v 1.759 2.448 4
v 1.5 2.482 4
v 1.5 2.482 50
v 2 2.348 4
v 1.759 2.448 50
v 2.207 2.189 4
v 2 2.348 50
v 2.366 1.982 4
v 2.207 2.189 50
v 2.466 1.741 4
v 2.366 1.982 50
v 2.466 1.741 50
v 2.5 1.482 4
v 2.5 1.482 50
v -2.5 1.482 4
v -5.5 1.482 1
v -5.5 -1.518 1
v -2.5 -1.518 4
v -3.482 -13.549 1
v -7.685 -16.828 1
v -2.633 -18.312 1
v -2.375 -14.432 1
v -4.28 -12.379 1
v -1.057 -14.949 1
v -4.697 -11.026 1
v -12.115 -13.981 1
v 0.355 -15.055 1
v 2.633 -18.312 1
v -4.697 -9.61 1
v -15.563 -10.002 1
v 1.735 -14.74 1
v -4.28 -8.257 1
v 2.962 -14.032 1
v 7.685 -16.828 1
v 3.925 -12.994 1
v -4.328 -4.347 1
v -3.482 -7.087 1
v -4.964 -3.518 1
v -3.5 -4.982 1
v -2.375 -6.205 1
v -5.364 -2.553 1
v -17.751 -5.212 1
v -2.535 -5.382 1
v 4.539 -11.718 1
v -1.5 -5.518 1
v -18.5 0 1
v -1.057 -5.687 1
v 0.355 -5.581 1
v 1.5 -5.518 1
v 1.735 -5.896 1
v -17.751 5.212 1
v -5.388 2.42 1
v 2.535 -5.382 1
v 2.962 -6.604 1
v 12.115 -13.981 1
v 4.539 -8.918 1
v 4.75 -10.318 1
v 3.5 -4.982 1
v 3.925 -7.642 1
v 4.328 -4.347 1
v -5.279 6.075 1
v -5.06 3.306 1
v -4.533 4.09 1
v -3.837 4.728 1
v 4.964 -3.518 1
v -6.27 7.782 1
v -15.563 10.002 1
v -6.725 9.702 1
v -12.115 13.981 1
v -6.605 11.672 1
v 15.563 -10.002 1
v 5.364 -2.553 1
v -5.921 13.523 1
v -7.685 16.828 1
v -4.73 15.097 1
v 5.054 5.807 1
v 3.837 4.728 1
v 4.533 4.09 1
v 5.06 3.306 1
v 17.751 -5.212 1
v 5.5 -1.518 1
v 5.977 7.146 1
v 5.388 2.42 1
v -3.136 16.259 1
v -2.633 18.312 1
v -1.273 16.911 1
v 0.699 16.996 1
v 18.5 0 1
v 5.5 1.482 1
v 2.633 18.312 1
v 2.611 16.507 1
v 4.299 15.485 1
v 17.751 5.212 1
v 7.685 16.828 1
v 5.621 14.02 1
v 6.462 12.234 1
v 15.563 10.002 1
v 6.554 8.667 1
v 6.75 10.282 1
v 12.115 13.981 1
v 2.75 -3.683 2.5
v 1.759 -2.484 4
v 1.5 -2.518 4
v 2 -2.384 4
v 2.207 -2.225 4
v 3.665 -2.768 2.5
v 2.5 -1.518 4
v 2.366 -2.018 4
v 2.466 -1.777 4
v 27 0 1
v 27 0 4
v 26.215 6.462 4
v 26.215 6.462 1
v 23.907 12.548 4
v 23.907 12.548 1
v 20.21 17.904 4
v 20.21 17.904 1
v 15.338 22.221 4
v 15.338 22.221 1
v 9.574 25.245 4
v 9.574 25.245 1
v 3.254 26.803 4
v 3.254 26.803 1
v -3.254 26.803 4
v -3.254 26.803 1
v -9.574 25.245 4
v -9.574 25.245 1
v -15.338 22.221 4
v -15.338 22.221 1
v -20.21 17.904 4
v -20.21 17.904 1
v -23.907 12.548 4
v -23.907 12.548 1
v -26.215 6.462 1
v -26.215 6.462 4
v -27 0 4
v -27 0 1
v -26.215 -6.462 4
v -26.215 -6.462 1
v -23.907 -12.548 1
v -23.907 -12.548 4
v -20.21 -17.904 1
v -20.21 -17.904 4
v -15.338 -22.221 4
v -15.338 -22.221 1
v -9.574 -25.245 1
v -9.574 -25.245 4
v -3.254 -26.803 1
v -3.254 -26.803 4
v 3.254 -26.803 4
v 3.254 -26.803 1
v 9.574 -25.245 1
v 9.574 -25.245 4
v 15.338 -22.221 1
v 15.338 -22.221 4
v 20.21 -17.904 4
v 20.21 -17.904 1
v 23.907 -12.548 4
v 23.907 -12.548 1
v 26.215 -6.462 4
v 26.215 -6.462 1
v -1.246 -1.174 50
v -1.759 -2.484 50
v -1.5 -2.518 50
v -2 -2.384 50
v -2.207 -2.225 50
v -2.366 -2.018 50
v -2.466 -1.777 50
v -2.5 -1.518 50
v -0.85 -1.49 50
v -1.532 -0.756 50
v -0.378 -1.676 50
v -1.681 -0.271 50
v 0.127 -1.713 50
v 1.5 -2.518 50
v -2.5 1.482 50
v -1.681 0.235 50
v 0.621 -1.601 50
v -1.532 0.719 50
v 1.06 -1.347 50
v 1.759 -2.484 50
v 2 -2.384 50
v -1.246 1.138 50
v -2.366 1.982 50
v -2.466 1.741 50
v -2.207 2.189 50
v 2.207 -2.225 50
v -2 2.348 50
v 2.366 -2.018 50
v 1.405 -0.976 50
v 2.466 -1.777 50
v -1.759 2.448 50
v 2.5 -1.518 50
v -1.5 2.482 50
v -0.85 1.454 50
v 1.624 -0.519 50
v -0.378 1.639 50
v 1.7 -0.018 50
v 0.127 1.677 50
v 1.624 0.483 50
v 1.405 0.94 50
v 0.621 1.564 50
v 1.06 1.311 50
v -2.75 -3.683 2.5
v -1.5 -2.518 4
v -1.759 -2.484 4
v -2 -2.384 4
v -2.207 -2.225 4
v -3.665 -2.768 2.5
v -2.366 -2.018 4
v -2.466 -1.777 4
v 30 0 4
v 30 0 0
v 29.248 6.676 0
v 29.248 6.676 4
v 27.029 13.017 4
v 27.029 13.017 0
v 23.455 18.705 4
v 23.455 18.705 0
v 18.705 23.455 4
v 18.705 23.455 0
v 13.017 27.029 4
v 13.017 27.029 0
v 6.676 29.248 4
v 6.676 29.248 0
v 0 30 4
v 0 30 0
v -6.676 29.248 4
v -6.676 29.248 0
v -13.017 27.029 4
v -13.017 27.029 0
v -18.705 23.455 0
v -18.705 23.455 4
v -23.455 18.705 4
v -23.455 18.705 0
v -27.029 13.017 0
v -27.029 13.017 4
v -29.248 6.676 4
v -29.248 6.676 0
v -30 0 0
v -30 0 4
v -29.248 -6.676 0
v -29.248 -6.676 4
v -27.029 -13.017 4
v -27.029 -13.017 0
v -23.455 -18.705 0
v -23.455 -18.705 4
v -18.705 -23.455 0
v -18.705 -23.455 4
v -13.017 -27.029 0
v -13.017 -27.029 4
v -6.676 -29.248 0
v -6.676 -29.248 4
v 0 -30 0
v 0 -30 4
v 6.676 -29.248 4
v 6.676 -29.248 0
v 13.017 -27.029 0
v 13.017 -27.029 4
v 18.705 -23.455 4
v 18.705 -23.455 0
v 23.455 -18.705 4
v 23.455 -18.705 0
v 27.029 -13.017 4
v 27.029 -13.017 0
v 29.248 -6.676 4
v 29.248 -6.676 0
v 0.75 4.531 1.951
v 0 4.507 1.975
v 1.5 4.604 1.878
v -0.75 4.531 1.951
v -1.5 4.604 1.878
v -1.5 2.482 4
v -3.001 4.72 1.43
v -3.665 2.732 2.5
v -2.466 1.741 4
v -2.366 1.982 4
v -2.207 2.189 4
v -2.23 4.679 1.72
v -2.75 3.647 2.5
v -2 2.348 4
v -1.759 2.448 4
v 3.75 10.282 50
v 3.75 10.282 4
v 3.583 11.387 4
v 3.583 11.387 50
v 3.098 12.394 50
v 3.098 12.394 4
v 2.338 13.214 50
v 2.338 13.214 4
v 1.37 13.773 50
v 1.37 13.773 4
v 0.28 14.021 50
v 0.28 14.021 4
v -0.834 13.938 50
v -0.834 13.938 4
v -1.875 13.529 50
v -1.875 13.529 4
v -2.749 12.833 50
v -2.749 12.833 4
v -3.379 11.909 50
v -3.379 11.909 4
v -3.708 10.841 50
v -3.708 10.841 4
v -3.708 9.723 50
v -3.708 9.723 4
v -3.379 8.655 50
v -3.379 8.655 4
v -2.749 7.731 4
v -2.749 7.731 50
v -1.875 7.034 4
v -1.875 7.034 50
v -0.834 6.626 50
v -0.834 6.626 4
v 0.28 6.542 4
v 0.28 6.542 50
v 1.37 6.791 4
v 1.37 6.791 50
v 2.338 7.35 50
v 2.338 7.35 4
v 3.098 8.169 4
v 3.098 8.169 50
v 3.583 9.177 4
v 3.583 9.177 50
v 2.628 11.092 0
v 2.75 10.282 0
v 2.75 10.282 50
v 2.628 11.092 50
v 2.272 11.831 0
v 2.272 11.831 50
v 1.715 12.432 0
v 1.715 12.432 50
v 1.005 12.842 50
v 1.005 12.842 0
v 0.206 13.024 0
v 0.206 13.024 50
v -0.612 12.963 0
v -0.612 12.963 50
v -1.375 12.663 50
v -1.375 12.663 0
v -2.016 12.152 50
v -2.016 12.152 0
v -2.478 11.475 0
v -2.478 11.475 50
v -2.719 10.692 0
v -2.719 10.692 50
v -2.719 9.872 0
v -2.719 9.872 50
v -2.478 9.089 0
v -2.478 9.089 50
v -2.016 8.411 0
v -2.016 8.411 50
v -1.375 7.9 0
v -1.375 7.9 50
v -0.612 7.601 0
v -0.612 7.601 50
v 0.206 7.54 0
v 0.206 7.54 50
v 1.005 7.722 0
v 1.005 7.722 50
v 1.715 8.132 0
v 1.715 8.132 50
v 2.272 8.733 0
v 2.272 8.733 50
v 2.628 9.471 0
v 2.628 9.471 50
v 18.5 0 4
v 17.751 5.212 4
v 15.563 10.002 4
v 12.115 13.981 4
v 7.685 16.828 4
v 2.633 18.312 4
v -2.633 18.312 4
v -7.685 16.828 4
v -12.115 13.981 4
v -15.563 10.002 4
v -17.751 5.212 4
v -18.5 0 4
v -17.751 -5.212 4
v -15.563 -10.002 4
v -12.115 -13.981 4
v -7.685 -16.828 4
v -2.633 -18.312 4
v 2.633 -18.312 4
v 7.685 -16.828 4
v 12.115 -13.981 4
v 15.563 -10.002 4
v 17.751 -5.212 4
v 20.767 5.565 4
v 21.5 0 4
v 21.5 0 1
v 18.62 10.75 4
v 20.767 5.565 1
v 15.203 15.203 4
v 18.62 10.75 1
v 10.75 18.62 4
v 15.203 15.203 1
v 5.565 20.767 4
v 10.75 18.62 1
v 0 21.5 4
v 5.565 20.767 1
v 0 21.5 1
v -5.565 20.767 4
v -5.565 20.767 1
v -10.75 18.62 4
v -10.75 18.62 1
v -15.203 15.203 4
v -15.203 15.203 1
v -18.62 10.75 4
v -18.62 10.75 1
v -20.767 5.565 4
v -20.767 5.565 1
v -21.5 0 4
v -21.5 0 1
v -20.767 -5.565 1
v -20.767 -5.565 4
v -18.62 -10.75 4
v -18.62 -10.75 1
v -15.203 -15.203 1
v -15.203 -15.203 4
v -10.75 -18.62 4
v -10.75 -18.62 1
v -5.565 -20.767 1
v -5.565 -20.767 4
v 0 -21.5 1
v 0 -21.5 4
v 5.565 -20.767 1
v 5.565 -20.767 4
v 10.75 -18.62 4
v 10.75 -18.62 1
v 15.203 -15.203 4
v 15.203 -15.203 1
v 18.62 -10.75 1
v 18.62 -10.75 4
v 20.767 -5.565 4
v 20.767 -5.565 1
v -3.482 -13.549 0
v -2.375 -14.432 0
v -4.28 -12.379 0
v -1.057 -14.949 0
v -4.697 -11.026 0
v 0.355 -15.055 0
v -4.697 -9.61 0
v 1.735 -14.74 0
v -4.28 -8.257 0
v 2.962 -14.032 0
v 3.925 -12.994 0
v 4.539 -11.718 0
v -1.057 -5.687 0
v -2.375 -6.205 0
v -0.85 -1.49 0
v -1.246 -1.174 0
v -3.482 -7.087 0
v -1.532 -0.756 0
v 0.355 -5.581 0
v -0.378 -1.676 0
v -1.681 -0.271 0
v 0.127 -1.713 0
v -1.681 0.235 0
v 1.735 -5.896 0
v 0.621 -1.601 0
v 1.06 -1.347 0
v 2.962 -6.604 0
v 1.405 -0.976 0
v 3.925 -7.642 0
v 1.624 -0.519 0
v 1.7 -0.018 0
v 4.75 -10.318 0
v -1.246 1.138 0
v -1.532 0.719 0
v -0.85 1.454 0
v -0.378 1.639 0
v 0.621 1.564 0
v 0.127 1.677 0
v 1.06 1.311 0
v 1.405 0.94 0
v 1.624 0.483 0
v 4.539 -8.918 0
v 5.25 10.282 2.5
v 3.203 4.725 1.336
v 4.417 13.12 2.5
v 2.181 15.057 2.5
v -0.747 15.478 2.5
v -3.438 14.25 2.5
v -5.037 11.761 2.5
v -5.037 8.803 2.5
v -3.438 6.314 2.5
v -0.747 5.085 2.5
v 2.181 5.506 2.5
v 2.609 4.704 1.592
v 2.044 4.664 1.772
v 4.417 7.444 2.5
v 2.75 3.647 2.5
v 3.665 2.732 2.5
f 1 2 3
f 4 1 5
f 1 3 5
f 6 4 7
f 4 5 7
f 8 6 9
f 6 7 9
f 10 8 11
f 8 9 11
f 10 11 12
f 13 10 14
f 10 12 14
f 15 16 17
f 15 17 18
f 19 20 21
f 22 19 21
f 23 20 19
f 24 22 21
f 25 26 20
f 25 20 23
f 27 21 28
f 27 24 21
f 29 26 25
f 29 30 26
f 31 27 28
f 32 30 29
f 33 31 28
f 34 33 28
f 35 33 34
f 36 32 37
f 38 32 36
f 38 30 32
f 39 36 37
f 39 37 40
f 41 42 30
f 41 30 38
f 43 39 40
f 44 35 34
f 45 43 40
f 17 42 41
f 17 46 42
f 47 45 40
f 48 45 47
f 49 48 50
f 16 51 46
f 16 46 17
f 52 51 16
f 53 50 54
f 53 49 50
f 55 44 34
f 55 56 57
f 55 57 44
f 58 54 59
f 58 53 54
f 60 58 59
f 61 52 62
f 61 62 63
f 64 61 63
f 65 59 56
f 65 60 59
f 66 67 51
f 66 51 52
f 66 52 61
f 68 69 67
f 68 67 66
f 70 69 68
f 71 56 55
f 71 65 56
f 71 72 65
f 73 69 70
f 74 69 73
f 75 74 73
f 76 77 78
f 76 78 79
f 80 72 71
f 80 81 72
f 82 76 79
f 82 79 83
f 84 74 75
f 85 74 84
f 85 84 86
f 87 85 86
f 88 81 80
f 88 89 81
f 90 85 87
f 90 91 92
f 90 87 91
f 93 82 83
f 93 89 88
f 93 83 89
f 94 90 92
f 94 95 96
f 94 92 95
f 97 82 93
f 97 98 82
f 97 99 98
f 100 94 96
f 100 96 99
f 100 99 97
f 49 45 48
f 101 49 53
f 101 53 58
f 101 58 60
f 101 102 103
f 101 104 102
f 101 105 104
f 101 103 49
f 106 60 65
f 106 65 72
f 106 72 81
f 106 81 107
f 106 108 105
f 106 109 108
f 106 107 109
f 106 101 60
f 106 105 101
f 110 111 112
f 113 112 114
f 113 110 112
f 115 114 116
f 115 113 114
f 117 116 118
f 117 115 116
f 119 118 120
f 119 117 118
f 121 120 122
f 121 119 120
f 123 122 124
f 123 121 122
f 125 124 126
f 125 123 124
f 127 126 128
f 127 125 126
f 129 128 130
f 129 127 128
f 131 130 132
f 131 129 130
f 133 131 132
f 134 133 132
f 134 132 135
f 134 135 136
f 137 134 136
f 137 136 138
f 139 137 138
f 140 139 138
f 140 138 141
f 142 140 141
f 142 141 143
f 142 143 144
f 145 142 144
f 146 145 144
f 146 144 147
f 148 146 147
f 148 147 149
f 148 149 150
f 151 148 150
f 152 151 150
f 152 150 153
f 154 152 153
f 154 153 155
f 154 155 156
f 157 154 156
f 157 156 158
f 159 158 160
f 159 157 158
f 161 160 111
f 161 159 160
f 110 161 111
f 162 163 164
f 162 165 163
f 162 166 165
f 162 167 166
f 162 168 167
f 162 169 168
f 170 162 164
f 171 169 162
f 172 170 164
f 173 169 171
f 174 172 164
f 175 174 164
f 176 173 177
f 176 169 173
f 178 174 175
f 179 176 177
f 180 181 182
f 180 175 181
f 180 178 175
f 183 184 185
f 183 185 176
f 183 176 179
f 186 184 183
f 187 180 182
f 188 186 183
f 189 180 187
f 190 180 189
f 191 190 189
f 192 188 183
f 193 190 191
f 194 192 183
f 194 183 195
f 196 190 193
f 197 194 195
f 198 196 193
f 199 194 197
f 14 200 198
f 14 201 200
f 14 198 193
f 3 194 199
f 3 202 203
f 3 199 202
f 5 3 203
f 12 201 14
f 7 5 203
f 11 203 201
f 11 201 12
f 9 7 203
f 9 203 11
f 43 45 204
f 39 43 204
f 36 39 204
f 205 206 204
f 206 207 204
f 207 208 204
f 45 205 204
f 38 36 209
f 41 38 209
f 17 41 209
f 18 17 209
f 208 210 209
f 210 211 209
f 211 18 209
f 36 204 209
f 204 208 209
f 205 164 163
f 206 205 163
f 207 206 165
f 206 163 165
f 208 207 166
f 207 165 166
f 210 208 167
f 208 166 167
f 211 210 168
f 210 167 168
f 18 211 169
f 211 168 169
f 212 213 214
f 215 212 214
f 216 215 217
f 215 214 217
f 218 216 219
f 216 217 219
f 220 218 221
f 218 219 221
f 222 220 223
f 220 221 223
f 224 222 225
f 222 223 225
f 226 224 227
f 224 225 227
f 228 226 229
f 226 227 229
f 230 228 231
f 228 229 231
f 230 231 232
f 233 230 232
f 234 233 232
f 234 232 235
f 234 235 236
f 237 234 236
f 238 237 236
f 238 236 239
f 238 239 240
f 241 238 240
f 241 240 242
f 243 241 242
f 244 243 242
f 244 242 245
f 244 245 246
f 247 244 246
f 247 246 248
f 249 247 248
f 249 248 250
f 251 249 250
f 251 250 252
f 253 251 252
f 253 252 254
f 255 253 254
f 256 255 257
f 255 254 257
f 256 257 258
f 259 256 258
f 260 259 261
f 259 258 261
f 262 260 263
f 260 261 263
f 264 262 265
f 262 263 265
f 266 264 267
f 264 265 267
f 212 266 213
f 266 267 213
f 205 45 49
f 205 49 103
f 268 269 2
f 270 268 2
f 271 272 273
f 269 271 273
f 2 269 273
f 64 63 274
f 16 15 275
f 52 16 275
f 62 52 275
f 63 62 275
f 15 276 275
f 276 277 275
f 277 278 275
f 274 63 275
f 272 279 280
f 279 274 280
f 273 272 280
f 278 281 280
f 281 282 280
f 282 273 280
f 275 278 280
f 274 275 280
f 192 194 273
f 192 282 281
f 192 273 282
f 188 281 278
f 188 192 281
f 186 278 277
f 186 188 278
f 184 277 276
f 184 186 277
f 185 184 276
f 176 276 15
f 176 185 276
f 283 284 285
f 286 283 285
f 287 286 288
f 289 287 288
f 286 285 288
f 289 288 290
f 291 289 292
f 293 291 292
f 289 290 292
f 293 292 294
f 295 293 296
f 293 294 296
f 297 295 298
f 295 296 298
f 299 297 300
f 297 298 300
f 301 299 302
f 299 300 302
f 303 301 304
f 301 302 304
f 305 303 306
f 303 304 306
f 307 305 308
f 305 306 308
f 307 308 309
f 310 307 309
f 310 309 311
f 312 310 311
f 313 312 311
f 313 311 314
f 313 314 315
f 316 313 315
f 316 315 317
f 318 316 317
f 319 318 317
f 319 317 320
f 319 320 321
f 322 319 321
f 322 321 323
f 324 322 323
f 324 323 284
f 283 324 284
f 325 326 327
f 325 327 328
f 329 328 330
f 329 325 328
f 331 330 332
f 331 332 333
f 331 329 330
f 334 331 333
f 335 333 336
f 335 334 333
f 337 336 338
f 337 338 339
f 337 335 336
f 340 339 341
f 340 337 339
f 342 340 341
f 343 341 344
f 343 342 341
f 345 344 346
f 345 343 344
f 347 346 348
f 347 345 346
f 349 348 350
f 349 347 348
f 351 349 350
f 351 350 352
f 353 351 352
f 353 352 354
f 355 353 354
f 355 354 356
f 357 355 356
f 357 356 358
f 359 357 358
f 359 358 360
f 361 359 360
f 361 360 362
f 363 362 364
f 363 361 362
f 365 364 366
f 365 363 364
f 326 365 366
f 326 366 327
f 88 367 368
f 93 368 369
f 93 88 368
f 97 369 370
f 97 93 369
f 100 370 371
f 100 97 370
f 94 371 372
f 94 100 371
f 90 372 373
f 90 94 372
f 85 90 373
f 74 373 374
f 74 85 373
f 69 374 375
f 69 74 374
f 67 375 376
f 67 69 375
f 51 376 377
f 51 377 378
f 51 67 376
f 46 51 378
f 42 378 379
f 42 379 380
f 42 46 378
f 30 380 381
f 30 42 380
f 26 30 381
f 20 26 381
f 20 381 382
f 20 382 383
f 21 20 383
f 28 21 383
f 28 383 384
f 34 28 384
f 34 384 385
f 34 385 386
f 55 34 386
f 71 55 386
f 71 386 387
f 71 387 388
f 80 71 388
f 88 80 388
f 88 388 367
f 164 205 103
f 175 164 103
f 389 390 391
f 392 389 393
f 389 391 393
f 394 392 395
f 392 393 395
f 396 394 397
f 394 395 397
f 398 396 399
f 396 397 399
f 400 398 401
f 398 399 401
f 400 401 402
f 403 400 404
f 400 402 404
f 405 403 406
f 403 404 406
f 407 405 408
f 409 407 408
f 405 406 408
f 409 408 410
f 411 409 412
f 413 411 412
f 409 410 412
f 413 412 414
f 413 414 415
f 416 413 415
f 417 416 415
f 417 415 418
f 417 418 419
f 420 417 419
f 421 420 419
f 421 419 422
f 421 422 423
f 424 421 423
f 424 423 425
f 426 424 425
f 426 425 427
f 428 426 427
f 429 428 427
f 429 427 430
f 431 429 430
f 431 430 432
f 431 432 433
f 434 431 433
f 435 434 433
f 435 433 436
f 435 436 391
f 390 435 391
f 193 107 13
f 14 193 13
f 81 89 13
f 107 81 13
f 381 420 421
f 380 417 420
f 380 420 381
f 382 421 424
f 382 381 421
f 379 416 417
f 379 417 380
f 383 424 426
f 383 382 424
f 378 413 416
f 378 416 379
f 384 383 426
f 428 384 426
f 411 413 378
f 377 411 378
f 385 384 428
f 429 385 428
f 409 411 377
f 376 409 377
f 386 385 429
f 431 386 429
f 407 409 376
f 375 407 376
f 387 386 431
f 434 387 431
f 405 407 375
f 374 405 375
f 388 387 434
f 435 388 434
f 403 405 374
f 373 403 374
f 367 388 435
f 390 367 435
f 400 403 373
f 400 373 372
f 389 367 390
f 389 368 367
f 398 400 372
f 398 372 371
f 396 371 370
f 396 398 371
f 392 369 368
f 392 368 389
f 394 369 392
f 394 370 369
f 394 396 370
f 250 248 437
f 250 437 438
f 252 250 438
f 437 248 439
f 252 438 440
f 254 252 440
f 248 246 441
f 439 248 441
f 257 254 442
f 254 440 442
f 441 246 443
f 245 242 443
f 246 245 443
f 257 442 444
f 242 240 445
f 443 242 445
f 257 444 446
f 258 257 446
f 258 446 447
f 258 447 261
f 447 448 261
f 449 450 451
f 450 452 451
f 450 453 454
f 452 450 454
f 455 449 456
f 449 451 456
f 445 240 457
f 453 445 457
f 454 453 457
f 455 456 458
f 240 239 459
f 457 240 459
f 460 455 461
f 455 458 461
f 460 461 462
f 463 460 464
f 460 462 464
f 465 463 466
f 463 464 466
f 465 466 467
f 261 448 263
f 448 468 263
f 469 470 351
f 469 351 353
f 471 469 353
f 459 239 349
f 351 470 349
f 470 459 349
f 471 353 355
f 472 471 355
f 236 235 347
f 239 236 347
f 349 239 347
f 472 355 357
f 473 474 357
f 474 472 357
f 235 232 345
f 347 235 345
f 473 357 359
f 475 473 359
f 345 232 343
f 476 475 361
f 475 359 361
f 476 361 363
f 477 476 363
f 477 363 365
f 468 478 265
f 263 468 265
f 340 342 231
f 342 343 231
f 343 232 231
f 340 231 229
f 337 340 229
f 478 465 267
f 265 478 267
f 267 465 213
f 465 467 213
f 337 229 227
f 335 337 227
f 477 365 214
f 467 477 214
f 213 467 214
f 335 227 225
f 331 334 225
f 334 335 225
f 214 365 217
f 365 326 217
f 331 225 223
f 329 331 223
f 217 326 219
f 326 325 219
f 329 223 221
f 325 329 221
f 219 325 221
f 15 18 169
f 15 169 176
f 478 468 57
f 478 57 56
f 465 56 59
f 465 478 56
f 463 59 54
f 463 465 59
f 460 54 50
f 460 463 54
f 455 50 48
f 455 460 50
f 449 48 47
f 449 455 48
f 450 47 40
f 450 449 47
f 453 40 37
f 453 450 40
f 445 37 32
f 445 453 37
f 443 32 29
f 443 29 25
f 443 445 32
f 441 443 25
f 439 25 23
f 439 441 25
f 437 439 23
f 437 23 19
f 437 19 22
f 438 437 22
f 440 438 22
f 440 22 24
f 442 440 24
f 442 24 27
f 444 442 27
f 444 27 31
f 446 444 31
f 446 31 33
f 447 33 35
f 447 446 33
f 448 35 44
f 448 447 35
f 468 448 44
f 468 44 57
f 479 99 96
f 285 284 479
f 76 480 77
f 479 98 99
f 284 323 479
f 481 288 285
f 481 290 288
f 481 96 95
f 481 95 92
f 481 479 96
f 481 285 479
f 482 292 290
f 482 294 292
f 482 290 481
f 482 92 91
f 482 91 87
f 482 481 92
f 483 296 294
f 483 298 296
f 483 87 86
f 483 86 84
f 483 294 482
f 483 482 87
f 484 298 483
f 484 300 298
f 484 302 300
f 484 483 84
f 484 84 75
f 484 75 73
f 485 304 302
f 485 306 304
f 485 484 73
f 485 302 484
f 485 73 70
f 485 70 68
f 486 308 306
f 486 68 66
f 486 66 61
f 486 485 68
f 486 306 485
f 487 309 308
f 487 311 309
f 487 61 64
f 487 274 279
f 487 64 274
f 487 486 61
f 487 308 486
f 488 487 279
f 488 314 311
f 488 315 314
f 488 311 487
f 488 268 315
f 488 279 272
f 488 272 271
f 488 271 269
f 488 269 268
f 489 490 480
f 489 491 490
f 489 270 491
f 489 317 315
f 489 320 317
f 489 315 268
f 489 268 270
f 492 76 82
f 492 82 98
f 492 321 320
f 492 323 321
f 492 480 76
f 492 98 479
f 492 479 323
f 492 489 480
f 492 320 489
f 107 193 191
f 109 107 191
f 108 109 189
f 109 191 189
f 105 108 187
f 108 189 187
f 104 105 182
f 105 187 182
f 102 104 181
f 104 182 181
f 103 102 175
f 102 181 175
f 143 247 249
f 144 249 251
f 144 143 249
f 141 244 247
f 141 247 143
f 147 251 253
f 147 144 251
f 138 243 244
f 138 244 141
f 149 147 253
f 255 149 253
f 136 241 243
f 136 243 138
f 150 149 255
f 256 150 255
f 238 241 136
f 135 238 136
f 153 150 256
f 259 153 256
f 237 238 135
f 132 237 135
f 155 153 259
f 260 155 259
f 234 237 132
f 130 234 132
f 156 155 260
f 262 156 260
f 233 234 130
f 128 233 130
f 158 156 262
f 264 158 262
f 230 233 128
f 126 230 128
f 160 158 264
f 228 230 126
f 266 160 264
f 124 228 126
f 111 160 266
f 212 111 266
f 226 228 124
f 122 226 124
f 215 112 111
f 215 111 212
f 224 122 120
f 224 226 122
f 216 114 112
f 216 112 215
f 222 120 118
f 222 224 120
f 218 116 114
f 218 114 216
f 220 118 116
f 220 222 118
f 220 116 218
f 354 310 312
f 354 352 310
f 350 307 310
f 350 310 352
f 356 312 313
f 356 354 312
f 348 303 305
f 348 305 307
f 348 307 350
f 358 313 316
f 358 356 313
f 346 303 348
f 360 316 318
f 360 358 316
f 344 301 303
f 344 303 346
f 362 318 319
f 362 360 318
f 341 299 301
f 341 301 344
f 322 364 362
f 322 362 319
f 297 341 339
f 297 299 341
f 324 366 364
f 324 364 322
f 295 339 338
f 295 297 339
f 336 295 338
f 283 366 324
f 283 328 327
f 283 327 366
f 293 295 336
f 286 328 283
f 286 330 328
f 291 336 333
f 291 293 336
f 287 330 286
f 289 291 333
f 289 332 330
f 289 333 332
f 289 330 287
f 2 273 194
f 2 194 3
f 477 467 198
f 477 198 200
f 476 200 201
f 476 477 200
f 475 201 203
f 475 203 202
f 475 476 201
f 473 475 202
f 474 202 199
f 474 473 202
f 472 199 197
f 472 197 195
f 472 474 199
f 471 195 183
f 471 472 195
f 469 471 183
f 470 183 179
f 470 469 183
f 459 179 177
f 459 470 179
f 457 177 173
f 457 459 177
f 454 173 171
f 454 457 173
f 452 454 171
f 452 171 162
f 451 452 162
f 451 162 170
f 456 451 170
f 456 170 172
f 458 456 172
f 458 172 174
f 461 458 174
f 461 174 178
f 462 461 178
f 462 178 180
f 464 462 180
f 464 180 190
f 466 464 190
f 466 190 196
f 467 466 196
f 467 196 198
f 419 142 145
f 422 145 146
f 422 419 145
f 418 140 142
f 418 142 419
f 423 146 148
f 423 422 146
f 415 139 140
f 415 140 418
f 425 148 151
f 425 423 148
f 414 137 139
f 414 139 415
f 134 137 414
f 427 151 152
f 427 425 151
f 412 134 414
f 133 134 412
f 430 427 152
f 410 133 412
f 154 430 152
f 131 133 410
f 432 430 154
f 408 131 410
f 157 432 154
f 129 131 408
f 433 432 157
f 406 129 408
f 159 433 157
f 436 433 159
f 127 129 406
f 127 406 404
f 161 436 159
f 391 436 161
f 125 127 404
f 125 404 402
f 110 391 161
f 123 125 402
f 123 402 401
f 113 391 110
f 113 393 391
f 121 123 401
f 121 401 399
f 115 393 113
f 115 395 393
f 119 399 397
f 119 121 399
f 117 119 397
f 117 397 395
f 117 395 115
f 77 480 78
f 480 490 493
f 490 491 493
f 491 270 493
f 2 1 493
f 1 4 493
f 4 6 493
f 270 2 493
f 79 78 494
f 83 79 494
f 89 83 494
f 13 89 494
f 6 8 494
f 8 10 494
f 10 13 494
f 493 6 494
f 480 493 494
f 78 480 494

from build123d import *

# Parameters (mm, degrees)
F0_R         = 30
F0_R_2       = 27
F0_R_3       = 21.5
F0_R_4       = 18.5
F0_R_5       = 4.75
F0_W         = 5
F0_H         = 5
F0_R_6       = 3.75
F0_R_7       = 1.7
F1_DEPTH     = 1
F2_DEPTH     = 4
F0_R_8       = 2.75
F3_DEPTH     = 50
F4_R         = 1
F5_T1_DEPTH  = 3
F5_T3_DEPTH  = 3
F5_T6_ANGLE  = 90
F5_T10_ANGLE = 90
F5_T12_ANGLE = 90
F5_T14_ANGLE = 90


# Not quite as in the source:
# - a fillet or chamfer that OpenCascade refuses, or shapes differently, is made with other operations: its cross-section is extruded or revolved along the edge and cut away or added


with BuildPart() as f1:
    # F0 (on Top) → F1 (new body)
    with BuildSketch(Plane.XY):
        Circle(F0_R)
        Circle(F0_R_2, mode=Mode.SUBTRACT)
        Circle(F0_R_2)
        Circle(F0_R_3, mode=Mode.SUBTRACT)
        Circle(F0_R_3)
        Circle(F0_R_4, mode=Mode.SUBTRACT)
        Circle(F0_R_4)
        with Locations((0, -10.3181230716)):
            Circle(F0_R_5, mode=Mode.SUBTRACT)
        with Locations((0, -0.0181230716)):
            Rectangle(F0_W, F0_H, mode=Mode.SUBTRACT)
        with Locations((0, 10.2818769284)):
            Circle(F0_R_6, mode=Mode.SUBTRACT)
        with Locations((0, -0.0181230716)):
            Rectangle(F0_W, F0_H)
        with Locations((0, -0.0181230716)):
            Circle(F0_R_7, mode=Mode.SUBTRACT)
    extrude(amount=F1_DEPTH)

    # F0 (on Top) → F2 (join)
    with BuildSketch(Plane.XY):
        Circle(F0_R)
        Circle(F0_R_2, mode=Mode.SUBTRACT)
        Circle(F0_R_3)
        Circle(F0_R_4, mode=Mode.SUBTRACT)
    extrude(amount=F2_DEPTH)

    # F0 (on Top) → F3 (join)
    with BuildSketch(Plane.XY):
        with Locations((0, -0.0181230716)):
            Rectangle(F0_W, F0_H)
        with Locations((0, -0.0181230716)):
            Circle(F0_R_7, mode=Mode.SUBTRACT)
        with Locations((0, 10.2818769284)):
            Circle(F0_R_6)
        with Locations((0, 10.2818769284)):
            Circle(F0_R_8, mode=Mode.SUBTRACT)
    extrude(amount=F3_DEPTH)

    # F4
    f4_edges = [f1.edges().sort_by_distance(p)[0] for p in [
        (-2.5, -2.518123, 25.5),
        (2.5, -2.518123, 25.5),
        (-2.5, 2.481877, 25.5),
        (2.5, 2.481877, 25.5),
    ]]
    fillet(f4_edges, radius=F4_R)

    # F5: chamfer of 3 on 3 edges, made by hand

    # F5_s2 → F5_t1 (join)
    with BuildSketch(Plane.YZ.offset(-1.5)):
        Polygon((-5.5181230716, 1), (-2.5181230716, 4), (-2.5181230716, 1), align=None)
        Polygon((5.4818769284, 1), (2.4818769284, 4), (2.4818769284, 1), align=None)
    extrude(amount=F5_T1_DEPTH)

    # F5_s4 → F5_t3 (join)
    with BuildSketch(Plane.XZ.offset(-1.4818769284)):
        Polygon((-5.5, 1), (-2.5, 4), (-2.5, 1), align=None)
        Polygon((5.5, 1), (2.5, 4), (2.5, 1), align=None)
    extrude(amount=F5_T3_DEPTH)

    # F5_s5 → F5_t6 (revolve)
    with BuildSketch(Plane.YZ.offset(-1.5)):
        Polygon((-5.5181230716, 1), (-2.5181230716, 4), (-2.5181230716, 1), align=None)
    revolve(axis=Axis((-1.5, -1.5181230716, 1), (0, 0, -1)), revolution_arc=F5_T6_ANGLE)

    # F5_s7 → F5_t8 (revolve)
    with BuildSketch(Plane.XZ.offset(-10.2818769284)):
        Polygon((6.75, 1), (3.75, 4), (3.75, 1), align=None)
    revolve(axis=Axis((0, 10.2818769284, 1), (0, 0, 1)))

    # F5_s9 → F5_t10 (revolve)
    with BuildSketch(Plane.XZ.offset(-1.4818769284)):
        Polygon((-5.5, 1), (-2.5, 4), (-2.5, 1), align=None)
    revolve(axis=Axis((-1.5, 1.4818769284, 1), (0, 0, -1)), revolution_arc=F5_T10_ANGLE)

    # F5_s11 → F5_t12 (revolve)
    with BuildSketch(Plane.YZ.offset(1.5)):
        Polygon((5.4818769284, 1), (2.4818769284, 4), (2.4818769284, 1), align=None)
    revolve(axis=Axis((1.5, 1.4818769284, 1), (0, 0, -1)), revolution_arc=F5_T12_ANGLE)

    # F5_s13 → F5_t14 (revolve)
    with BuildSketch(Plane.YZ.offset(1.5)):
        Polygon((-5.5181230716, 1), (-2.5181230716, 4), (-2.5181230716, 1), align=None)
    revolve(axis=Axis((1.5, -1.5181230716, 1), (0, 0, 1)), revolution_arc=F5_T14_ANGLE)


solid = f1.part
